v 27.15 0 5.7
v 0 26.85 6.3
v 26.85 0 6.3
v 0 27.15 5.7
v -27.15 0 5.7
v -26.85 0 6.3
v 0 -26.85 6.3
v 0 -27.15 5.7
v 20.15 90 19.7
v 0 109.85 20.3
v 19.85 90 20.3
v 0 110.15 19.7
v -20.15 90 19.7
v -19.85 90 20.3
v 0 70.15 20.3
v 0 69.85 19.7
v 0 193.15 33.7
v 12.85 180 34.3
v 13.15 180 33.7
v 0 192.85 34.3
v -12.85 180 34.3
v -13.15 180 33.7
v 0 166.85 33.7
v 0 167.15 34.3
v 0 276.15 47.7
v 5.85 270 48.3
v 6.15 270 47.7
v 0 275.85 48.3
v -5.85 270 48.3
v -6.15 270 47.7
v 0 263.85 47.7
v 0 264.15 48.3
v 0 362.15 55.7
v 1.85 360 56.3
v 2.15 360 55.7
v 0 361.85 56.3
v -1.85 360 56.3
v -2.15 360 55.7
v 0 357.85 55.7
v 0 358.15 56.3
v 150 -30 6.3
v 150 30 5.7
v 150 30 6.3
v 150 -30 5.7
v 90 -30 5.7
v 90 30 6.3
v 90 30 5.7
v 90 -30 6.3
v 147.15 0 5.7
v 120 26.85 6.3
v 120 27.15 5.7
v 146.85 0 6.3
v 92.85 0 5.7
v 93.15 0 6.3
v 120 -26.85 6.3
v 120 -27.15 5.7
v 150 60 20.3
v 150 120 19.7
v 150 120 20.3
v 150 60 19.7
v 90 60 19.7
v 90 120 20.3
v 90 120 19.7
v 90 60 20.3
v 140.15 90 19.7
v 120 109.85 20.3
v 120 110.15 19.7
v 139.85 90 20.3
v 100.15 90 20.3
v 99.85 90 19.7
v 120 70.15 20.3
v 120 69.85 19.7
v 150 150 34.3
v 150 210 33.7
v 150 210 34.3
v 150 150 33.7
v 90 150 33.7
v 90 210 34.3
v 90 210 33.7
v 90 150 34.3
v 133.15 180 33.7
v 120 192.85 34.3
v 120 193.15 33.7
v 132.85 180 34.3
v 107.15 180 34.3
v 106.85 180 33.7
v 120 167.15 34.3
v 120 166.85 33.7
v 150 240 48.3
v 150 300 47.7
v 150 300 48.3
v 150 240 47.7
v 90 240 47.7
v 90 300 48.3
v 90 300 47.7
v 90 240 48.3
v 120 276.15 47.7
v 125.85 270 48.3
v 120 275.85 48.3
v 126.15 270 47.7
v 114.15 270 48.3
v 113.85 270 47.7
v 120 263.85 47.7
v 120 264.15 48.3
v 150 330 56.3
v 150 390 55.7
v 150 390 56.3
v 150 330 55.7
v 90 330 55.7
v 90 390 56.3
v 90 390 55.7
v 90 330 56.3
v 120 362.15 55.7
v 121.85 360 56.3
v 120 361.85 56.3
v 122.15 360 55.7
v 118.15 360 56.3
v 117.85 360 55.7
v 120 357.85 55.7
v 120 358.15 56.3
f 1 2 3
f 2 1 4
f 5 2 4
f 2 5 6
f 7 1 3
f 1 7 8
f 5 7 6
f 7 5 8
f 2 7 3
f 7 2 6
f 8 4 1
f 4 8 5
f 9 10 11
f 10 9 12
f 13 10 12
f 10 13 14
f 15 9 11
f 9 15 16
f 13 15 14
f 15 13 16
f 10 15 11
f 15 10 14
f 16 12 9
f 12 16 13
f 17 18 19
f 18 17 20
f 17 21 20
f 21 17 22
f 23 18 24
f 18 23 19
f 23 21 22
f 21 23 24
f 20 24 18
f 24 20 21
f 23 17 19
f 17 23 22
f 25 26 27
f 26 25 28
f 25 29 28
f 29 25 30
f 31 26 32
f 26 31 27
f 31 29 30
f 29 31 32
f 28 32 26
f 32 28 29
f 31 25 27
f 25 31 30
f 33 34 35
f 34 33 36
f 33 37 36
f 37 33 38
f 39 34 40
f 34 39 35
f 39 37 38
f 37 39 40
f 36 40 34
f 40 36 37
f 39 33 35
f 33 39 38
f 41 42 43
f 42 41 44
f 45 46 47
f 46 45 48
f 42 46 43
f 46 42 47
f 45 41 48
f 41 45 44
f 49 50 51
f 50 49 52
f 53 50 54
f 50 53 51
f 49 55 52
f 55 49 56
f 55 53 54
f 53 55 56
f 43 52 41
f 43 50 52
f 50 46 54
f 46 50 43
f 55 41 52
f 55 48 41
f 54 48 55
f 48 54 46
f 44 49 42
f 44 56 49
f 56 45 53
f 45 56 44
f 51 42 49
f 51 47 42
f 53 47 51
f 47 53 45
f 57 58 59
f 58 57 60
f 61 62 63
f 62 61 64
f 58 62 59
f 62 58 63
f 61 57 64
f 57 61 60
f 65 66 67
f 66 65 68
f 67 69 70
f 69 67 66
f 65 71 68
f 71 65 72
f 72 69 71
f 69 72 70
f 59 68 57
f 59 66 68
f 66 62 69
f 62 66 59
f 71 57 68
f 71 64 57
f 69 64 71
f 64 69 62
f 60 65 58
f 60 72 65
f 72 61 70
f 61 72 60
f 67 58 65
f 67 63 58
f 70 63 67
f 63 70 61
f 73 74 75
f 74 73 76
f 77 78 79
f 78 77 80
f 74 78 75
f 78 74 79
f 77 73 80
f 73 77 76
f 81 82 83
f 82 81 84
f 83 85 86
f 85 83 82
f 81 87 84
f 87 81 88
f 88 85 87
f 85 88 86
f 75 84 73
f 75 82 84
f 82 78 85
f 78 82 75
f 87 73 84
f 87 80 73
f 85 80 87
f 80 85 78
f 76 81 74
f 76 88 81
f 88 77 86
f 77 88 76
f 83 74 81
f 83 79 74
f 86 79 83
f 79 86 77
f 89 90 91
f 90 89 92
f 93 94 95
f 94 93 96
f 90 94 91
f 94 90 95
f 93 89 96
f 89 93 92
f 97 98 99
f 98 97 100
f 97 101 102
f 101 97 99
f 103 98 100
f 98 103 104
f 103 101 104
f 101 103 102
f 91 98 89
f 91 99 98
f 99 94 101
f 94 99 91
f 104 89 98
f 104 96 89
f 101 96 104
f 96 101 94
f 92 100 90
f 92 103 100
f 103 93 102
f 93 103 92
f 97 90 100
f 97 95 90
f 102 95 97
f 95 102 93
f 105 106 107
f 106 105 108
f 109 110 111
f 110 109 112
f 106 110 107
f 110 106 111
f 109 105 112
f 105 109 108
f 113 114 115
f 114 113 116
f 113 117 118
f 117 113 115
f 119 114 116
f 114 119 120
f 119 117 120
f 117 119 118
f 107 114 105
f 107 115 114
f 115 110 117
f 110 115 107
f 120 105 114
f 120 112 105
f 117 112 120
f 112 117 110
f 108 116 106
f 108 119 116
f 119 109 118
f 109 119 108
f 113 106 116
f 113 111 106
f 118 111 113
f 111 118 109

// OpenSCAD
// file: _fillet_ref.scad
// -----------------------------------------------------------------------------
// M1 visual harness — shared reference tools + cross-cut viewer
//
// These are HAND-WRITTEN reference fillet/round/chamfer tools built from the
// classic OpenSCAD idioms (annulus - torus, wedge - cylinder, ...). They do NOT
// depend on the fillet_tool/round_tool nodes, so they render today and give the
// known-good target that later milestones (M5, M7) must reproduce.
//
// Convention for every case: geometry is built so the feature EDGE runs along Z,
// and we take a thin-slab horizontal cross-section (normal +Z). One image then
// shows, side by side along X:
//     [ base model ] [ applied result ] [ isolated tool solid ]
// and, stacked along Y, a small radius and a large radius (>= surface extent).
// -----------------------------------------------------------------------------

// Thin-slab section: intersect children with a thin horizontal slab at height z.
// XY size is deliberately huge so it covers the whole laid-out scene; only z and
// thickness matter for what the section shows.
module fillet_section(z = 0, thickness = 0.6, extent = 4000) {
  intersection() {
    children();
    translate([0, 0, z]) cube([extent, extent, thickness], center = true);
  }
}

// Vertical thin-slab section (normal +Y), for axis-symmetric ring features where
// a cut through the axis shows the rho-z profile and the ring fillet on both sides.
module fillet_vsection(y = 0, thickness = 0.6, extent = 4000) {
  intersection() {
    children();
    translate([0, y, 0]) cube([extent, thickness, extent], center = true);
  }
}

// Stack several thin-slab sections at different heights, translated apart along
// +Y so the section EVOLVING toward a junction is visible at a glance (used for
// the 3-/4-face meeting-point cases).
module fillet_contour_stack(zs, thickness = 0.6, spacing = 90, extent = 4000) {
  for (i = [0 : len(zs) - 1])
    translate([0, i * spacing, 0])
      fillet_section(z = zs[i], thickness = thickness, extent = extent)
        children();
}

// ---- reference tools for a single 90-degree edge running along Z -------------

// Inner (concave) fillet bead. Faces are x = cx (material x < cx) and y = cy
// (material y < cy); the reentrant quadrant opens toward +x,+y. Union this with
// the model. Cross-section = corner square minus a quarter disc (= a fillet).
module ref_fillet_edge_z(cx, cy, r, h, z0 = 0) {
  translate([0, 0, z0])
    difference() {
      translate([cx, cy, 0]) cube([r, r, h]);
      translate([cx + r, cy + r, -1]) cylinder(r = r, h = h + 2);
    }
}

// Outer (convex) round tool. Convex corner at (cx,cy), material x < cx & y < cy.
// SUBTRACT this from the model; it is the sharp corner sliver outside the arc.
module ref_round_edge_z(cx, cy, r, h, z0 = 0) {
  translate([0, 0, z0])
    difference() {
      translate([cx - r, cy - r, 0]) cube([r, r, h]);
      translate([cx - r, cy - r, -1]) cylinder(r = r, h = h + 2);
    }
}

// Inner (concave) chamfer bead — the wedge alone, no arc. Union with the model.
module ref_chamfer_edge_z(cx, cy, t, h, z0 = 0) {
  translate([0, 0, z0])
    linear_extrude(h)
      polygon([[cx, cy], [cx + t, cy], [cx, cy + t]]);
}
// main file
// Case E — 4-face meeting point via a low-$fn cone ($fn = 4 -> square-pyramid
// apex). Same layout as case_junction3, one more face at the junction.
//   left  column: the pyramid          -> CONVEX 4-face junction (round_tool)
//   right column: cube minus pyramid    -> CONCAVE 4-face pocket   (fillet_tool)
//
// No hand reference blend: the symmetric 4-face corner collapses to a single
// corner sphere, asymmetric ones to a hull of feasible spheres (plan §6.3.1) —
// milestone M9. This visualises the section-evolution target for M9.

include <_fillet_ref.scad>;

$fn = 4;            // 4-face apex (square pyramid)

R  = 30;
Hc = 60;
zs = [6, 20, 34, 48, 56];

module pyr_up() { cylinder(r1 = R, r2 = 0, h = Hc); }

module pocket() {
  difference() {
    translate([-R, -R, 0]) cube([2 * R, 2 * R, Hc]);
    pyr_up();
  }
}

fillet_contour_stack(zs) pyr_up();
translate([120, 0, 0]) fillet_contour_stack(zs) pocket();
